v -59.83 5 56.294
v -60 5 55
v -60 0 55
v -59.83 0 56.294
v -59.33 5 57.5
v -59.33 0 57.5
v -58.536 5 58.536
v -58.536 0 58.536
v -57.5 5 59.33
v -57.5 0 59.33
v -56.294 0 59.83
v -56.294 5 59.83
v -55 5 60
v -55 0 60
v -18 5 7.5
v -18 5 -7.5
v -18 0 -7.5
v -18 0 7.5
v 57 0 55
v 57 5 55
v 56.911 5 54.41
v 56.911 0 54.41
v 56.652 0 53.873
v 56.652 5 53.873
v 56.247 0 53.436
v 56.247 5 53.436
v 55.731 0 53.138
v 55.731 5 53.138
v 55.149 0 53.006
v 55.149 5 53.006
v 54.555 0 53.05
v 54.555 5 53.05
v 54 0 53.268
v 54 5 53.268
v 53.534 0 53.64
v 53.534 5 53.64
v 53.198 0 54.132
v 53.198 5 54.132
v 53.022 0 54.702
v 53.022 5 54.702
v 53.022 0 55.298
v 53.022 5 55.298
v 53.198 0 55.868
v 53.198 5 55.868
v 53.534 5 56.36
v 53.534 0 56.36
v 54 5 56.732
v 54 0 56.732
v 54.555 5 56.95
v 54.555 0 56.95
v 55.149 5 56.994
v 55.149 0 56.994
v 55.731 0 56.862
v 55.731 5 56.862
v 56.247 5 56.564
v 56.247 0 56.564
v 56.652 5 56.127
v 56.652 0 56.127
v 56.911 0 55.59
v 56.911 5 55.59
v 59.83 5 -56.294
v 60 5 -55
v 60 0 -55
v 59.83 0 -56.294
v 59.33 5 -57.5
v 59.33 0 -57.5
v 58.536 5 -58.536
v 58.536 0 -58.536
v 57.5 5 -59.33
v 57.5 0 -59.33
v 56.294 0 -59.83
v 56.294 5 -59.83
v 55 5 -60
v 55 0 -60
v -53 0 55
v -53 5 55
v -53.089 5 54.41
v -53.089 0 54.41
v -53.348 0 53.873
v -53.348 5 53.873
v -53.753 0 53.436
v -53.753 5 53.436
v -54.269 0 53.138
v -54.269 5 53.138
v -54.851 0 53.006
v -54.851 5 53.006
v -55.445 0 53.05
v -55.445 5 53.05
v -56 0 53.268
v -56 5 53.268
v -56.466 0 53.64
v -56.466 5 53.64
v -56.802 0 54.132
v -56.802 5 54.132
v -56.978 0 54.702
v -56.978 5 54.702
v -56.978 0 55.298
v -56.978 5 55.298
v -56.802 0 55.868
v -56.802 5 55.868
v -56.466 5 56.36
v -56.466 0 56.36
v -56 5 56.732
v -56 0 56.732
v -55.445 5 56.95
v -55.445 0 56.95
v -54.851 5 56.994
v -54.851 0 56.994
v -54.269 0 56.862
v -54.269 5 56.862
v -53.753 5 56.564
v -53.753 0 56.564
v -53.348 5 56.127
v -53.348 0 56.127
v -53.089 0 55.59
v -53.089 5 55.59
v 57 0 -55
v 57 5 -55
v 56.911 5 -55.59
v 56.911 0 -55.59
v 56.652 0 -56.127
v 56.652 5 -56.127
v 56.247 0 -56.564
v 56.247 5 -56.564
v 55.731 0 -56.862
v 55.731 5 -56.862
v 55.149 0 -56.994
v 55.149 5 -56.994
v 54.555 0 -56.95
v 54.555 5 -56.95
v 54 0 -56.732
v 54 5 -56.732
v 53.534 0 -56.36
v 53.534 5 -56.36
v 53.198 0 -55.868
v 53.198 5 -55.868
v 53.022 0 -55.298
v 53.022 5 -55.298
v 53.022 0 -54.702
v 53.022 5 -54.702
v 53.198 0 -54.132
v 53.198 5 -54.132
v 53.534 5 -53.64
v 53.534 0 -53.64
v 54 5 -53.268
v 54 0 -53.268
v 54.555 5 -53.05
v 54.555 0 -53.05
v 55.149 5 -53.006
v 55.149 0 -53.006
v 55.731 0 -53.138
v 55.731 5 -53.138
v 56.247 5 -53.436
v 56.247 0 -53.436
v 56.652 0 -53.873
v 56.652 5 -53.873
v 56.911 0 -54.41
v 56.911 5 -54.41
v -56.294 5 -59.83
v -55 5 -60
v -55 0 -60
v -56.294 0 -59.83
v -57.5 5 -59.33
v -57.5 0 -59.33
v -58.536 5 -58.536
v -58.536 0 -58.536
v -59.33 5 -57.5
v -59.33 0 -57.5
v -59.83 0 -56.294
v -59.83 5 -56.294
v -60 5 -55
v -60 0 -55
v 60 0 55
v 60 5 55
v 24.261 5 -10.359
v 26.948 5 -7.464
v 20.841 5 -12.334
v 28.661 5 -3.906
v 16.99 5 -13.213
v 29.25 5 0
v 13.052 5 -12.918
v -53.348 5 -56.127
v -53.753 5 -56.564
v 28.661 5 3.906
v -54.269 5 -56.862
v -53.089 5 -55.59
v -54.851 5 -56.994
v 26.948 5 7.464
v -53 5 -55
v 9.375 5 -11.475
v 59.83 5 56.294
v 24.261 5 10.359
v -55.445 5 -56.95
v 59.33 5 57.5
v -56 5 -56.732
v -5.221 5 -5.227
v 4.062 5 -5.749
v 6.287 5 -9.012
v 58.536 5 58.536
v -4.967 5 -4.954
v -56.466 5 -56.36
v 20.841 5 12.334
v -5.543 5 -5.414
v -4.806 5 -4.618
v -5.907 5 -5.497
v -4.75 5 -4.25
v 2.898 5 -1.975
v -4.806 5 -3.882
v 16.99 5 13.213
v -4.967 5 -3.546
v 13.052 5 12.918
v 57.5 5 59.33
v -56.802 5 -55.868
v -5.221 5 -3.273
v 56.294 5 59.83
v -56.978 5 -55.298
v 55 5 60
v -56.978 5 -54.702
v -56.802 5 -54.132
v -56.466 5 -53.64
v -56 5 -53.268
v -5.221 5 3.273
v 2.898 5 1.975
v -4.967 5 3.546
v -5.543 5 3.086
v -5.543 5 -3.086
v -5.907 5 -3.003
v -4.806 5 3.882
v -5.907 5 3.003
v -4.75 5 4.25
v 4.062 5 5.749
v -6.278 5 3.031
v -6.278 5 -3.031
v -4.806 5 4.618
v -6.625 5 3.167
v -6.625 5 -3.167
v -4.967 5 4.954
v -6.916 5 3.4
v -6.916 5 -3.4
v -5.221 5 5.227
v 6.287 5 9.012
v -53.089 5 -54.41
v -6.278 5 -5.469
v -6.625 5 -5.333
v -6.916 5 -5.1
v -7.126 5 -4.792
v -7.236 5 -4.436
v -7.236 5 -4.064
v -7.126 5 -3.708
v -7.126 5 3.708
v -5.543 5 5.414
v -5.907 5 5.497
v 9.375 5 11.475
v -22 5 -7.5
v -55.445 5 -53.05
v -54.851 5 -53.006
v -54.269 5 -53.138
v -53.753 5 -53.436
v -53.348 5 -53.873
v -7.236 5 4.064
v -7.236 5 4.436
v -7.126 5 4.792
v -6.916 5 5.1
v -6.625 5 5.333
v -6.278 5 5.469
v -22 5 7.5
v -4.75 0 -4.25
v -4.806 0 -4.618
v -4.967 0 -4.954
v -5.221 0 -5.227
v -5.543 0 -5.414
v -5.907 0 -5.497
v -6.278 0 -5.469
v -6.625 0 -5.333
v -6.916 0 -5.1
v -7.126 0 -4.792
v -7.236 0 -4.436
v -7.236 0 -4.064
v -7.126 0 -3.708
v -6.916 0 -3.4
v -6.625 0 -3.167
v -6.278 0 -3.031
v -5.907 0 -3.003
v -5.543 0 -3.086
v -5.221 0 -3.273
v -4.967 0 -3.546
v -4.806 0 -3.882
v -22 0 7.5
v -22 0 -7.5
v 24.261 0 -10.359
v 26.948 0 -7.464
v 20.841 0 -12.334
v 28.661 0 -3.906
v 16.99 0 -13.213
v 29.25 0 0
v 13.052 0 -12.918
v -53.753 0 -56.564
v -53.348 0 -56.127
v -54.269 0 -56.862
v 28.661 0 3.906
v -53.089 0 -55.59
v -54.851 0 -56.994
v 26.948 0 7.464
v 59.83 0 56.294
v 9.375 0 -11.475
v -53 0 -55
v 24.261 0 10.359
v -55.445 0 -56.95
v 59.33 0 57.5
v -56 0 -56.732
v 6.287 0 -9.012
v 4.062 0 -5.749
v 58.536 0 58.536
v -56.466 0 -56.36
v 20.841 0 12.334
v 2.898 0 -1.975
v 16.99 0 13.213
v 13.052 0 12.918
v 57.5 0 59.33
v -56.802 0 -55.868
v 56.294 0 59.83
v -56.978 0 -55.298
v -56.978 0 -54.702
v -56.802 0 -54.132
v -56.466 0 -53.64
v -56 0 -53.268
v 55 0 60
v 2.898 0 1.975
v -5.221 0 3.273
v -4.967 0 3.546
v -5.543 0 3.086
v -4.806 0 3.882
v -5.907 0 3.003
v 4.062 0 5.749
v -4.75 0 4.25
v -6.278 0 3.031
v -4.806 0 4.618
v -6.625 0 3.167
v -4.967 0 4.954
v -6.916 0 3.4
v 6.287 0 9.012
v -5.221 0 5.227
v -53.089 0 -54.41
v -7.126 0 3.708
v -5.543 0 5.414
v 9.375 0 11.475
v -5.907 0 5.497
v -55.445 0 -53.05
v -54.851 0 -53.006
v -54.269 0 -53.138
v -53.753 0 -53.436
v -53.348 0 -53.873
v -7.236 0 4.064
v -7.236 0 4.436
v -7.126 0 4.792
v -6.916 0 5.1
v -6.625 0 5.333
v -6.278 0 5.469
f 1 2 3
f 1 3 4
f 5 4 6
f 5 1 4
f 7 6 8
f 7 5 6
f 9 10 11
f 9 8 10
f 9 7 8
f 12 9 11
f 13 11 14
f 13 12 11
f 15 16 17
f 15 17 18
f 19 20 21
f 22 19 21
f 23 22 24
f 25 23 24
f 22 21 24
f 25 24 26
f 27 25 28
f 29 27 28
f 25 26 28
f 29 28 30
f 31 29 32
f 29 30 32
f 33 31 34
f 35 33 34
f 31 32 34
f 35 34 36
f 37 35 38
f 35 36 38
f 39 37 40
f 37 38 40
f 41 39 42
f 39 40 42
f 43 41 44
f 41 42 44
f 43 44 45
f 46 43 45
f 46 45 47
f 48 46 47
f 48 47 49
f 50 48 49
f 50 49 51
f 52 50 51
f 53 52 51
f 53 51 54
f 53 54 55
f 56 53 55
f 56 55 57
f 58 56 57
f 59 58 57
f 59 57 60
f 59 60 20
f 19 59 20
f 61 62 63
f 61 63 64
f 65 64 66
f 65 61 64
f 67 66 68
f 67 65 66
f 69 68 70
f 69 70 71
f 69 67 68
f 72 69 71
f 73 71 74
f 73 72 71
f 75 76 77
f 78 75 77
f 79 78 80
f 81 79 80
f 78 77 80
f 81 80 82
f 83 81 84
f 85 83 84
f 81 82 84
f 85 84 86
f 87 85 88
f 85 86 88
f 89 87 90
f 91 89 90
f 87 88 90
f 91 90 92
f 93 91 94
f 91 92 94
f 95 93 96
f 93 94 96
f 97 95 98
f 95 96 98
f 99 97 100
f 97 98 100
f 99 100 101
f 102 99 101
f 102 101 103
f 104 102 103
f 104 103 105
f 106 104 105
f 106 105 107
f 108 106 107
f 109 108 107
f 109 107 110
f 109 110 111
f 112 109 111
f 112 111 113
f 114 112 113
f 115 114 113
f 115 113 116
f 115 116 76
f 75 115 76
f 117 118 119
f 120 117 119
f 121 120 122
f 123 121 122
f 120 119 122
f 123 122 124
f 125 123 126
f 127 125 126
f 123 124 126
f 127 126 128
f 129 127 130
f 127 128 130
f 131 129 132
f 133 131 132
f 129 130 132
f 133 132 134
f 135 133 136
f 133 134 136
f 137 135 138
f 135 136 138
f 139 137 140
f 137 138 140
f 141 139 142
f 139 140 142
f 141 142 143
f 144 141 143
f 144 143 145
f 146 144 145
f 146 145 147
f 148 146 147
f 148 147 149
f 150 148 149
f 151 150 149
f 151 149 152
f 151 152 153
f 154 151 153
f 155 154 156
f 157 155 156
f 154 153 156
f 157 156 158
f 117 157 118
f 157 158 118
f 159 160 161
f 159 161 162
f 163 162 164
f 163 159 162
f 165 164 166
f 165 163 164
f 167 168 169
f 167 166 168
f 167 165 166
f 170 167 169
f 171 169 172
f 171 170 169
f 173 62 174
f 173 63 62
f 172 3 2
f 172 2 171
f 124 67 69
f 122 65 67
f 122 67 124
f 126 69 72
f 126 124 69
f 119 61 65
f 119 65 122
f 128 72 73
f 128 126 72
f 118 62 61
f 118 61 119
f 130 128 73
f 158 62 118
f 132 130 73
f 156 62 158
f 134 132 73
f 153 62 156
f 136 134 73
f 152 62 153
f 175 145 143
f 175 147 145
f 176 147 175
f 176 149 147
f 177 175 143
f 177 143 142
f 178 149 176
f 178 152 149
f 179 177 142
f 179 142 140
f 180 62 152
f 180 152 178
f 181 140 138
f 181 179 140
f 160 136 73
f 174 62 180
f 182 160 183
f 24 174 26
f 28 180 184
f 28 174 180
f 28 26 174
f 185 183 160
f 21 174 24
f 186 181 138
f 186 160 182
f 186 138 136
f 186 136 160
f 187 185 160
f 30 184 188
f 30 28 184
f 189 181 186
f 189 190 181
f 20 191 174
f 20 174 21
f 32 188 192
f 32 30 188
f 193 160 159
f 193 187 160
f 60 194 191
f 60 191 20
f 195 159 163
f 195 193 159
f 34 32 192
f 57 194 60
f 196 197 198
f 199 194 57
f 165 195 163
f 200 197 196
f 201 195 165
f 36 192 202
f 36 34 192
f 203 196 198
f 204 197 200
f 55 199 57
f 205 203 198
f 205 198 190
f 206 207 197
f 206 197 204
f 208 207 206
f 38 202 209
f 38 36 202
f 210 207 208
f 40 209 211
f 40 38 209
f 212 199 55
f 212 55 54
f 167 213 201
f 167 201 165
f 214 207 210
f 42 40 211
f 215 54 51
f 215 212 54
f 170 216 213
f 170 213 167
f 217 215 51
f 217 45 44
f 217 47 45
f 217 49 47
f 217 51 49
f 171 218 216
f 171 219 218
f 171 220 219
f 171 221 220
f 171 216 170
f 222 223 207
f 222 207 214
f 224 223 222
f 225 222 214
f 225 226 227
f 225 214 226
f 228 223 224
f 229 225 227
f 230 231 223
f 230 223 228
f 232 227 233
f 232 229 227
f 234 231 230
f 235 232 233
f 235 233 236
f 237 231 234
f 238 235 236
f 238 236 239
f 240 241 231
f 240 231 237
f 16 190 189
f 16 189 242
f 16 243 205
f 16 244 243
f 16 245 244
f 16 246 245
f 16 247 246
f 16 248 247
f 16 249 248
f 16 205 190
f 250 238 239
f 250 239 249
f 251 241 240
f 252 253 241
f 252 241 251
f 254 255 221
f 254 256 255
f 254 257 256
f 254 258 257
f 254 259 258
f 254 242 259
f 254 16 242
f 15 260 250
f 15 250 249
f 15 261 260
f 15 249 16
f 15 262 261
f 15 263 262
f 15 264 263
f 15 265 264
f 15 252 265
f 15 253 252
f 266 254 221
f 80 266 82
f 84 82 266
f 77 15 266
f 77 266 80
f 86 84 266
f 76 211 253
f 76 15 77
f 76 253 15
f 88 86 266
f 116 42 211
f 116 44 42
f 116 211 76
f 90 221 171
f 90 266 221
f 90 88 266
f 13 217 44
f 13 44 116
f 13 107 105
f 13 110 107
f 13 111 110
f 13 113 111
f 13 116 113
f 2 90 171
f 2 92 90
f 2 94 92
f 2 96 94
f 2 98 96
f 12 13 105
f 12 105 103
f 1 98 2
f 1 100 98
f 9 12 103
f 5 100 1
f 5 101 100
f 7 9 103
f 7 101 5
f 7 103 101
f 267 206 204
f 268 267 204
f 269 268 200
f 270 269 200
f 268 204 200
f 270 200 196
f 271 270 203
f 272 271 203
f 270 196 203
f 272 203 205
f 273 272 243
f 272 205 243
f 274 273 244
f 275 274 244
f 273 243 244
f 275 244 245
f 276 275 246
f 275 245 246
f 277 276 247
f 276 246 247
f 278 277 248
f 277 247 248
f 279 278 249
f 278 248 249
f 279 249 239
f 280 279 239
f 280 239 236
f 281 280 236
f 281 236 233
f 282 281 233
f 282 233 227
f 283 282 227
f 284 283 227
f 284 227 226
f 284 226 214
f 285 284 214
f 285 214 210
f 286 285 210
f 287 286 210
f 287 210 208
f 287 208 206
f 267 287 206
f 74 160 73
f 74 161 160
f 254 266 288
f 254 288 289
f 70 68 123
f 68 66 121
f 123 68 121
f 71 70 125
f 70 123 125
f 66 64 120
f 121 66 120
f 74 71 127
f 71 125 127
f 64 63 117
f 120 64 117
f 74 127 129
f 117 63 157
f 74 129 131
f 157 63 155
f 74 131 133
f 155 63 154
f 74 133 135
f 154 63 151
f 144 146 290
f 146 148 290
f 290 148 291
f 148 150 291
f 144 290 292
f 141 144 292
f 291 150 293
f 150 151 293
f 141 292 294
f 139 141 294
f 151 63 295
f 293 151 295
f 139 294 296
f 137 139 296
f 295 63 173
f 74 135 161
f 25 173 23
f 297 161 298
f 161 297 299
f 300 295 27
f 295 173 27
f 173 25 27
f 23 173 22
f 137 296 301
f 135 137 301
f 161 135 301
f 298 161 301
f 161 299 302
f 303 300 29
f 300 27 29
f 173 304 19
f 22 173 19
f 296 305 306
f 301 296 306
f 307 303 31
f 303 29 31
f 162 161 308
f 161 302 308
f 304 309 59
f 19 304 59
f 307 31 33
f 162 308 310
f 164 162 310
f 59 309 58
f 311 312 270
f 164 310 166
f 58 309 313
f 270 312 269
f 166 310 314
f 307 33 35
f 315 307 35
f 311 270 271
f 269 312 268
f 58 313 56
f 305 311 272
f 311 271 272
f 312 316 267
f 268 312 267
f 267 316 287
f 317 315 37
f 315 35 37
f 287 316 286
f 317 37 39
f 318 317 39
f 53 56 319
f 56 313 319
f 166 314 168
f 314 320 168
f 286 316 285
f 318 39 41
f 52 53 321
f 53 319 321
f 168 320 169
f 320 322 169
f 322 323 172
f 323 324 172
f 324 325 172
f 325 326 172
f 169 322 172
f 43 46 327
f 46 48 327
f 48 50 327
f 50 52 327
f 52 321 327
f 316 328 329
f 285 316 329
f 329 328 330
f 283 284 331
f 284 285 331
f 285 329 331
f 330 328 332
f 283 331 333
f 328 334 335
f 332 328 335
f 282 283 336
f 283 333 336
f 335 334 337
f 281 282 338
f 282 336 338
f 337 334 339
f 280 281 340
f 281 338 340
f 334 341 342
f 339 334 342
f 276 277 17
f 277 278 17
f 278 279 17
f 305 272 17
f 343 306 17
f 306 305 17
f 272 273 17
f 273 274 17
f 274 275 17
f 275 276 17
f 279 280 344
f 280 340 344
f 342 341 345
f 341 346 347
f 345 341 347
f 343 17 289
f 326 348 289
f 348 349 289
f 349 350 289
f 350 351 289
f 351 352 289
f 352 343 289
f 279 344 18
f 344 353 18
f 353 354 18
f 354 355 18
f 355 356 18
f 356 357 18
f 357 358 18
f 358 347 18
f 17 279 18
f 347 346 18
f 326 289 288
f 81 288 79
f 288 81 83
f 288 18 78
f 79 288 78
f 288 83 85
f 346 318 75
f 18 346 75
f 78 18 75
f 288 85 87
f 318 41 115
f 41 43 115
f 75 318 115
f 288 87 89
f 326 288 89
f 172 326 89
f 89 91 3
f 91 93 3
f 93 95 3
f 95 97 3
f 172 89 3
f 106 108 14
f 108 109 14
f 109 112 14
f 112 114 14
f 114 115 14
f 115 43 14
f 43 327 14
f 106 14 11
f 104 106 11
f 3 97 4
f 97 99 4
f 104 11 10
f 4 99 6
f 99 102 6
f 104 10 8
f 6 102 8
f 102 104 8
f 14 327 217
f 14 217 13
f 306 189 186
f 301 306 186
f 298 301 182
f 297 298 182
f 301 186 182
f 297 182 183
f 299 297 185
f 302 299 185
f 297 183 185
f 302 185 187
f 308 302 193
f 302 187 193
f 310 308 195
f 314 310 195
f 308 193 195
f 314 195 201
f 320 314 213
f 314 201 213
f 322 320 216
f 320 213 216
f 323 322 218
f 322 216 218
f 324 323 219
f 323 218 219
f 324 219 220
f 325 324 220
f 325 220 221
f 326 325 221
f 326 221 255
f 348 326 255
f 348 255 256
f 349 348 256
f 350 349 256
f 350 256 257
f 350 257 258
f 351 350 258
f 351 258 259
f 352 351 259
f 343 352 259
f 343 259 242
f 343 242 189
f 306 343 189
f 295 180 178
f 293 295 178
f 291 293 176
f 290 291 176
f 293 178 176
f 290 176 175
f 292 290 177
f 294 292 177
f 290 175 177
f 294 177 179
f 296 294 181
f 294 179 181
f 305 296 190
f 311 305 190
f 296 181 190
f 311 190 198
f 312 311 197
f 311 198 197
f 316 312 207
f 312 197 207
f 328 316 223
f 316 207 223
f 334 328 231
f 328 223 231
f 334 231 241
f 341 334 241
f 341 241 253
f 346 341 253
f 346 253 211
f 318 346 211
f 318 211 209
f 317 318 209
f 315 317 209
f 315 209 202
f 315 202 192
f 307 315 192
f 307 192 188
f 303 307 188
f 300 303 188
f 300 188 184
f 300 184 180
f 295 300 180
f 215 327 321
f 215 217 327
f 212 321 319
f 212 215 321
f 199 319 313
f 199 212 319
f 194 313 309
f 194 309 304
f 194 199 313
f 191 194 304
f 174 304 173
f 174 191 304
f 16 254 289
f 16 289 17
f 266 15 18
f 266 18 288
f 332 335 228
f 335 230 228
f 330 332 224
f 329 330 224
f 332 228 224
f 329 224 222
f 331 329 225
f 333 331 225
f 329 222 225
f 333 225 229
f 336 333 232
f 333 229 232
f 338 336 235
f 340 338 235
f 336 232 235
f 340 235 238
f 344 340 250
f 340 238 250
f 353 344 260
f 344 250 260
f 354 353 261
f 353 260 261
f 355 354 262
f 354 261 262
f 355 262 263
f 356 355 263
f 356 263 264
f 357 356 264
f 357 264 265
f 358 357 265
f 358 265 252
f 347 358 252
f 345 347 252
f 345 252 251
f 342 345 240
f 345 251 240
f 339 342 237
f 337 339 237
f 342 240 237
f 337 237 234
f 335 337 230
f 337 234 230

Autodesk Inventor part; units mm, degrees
ref_plane "YZ Plane" through (0, 0, 0) normal (1, 0, 0) x (0, 1, 0)
ref_plane "XZ Plane" through (0, 0, 0) normal (0, 1, 0) x (-1, 0, 0)
ref_plane "XY Plane" through (0, 0, 0) normal (0, 0, 1) x (1, 0, 0)
sketch "Sketch1" plane through (0, 0, 0) normal (0, 1, 0) x (-1, 0, 0)
  line L0 (-60, 60) -> (60, 60)
  line L1 (60, 60) -> (60, -60)
  line L2 (60, -60) -> (-60, -60)
  line L3 (-60, -60) -> (-60, 60)
  line L4 (-60, 60) -> (60, -60) construction
  line L5 (60, 60) -> (-60, -60) construction
  point P0 (0, 0)
  dimension "d0" = 120
  dimension "d1" = 120
extrude "Extrusion1" add sketch "Sketch1" along normal blind 5
sketch "Sketch2" plane through (0, 5, 0) normal (0, 1, 0) x (1, 0, 0)
  line L0 (55, -55) -> (-55, -55) construction
  line L1 (-55, -55) -> (-55, 55) construction
  line L2 (-55, 55) -> (55, 55) construction
  line L3 (55, 55) -> (55, -55) construction
  line L4 (55, -55) -> (-55, 55) construction
  line L5 (-55, -55) -> (55, 55) construction
  circle A0 centre (-55, 55) radius 2
  circle A1 centre (-55, -55) radius 2
  circle A2 centre (55, 55) radius 2
  circle A3 centre (55, -55) radius 2
  point P0 (0, 0)
  dimension "d4" = 110
  dimension "d5" = 110
  dimension "d6" = 4
  dimension "d7" = 4
  dimension "d8" = 4
  dimension "d9" = 4
extrude "Extrusion2" cut sketch "Sketch2" against normal blind 5
fillet "Fillet1" radius 5 4 edges at (60, 2.5, -60) (60, 2.5, 60) (-60, 2.5, -60) (-60, 2.5, 60)
sketch "Sketch4" plane through (0, 5, 0) normal (0, 1, 0) x (1, 0, 0)
  line L0 (-22, 7.5) -> (-18, 7.5)
  line L1 (-18, 7.5) -> (-18, -7.5)
  line L2 (-18, -7.5) -> (-22, -7.5)
  line L3 (-22, -7.5) -> (-22, 7.5)
  line L4 (-22, 7.5) -> (-18, -7.5) construction
  line L5 (-18, 7.5) -> (-22, -7.5) construction
  circle A0 centre (-6, 4.25) radius 1.25
  circle A1 centre (-6, -4.25) radius 1.25
  circle A2 centre (16, 0) radius 13.25
  point P0 (0, 0)
  point P1 (-20, 0)
  dimension "d14" = 4
  dimension "d15" = 15
  dimension "d16" = 20
  dimension "d17" = 14
  dimension "d18" = 14
  dimension "d19" = 2.5
  dimension "d20" = 2.5
  dimension "d21" = 8.5
  dimension "d22" = 4.25
  dimension "d25" = 26.5
  dimension "d26" = 16
extrude "Extrusion3" cut sketch "Sketch4" against normal blind 10
properties part number "Calibration Arena 2"
